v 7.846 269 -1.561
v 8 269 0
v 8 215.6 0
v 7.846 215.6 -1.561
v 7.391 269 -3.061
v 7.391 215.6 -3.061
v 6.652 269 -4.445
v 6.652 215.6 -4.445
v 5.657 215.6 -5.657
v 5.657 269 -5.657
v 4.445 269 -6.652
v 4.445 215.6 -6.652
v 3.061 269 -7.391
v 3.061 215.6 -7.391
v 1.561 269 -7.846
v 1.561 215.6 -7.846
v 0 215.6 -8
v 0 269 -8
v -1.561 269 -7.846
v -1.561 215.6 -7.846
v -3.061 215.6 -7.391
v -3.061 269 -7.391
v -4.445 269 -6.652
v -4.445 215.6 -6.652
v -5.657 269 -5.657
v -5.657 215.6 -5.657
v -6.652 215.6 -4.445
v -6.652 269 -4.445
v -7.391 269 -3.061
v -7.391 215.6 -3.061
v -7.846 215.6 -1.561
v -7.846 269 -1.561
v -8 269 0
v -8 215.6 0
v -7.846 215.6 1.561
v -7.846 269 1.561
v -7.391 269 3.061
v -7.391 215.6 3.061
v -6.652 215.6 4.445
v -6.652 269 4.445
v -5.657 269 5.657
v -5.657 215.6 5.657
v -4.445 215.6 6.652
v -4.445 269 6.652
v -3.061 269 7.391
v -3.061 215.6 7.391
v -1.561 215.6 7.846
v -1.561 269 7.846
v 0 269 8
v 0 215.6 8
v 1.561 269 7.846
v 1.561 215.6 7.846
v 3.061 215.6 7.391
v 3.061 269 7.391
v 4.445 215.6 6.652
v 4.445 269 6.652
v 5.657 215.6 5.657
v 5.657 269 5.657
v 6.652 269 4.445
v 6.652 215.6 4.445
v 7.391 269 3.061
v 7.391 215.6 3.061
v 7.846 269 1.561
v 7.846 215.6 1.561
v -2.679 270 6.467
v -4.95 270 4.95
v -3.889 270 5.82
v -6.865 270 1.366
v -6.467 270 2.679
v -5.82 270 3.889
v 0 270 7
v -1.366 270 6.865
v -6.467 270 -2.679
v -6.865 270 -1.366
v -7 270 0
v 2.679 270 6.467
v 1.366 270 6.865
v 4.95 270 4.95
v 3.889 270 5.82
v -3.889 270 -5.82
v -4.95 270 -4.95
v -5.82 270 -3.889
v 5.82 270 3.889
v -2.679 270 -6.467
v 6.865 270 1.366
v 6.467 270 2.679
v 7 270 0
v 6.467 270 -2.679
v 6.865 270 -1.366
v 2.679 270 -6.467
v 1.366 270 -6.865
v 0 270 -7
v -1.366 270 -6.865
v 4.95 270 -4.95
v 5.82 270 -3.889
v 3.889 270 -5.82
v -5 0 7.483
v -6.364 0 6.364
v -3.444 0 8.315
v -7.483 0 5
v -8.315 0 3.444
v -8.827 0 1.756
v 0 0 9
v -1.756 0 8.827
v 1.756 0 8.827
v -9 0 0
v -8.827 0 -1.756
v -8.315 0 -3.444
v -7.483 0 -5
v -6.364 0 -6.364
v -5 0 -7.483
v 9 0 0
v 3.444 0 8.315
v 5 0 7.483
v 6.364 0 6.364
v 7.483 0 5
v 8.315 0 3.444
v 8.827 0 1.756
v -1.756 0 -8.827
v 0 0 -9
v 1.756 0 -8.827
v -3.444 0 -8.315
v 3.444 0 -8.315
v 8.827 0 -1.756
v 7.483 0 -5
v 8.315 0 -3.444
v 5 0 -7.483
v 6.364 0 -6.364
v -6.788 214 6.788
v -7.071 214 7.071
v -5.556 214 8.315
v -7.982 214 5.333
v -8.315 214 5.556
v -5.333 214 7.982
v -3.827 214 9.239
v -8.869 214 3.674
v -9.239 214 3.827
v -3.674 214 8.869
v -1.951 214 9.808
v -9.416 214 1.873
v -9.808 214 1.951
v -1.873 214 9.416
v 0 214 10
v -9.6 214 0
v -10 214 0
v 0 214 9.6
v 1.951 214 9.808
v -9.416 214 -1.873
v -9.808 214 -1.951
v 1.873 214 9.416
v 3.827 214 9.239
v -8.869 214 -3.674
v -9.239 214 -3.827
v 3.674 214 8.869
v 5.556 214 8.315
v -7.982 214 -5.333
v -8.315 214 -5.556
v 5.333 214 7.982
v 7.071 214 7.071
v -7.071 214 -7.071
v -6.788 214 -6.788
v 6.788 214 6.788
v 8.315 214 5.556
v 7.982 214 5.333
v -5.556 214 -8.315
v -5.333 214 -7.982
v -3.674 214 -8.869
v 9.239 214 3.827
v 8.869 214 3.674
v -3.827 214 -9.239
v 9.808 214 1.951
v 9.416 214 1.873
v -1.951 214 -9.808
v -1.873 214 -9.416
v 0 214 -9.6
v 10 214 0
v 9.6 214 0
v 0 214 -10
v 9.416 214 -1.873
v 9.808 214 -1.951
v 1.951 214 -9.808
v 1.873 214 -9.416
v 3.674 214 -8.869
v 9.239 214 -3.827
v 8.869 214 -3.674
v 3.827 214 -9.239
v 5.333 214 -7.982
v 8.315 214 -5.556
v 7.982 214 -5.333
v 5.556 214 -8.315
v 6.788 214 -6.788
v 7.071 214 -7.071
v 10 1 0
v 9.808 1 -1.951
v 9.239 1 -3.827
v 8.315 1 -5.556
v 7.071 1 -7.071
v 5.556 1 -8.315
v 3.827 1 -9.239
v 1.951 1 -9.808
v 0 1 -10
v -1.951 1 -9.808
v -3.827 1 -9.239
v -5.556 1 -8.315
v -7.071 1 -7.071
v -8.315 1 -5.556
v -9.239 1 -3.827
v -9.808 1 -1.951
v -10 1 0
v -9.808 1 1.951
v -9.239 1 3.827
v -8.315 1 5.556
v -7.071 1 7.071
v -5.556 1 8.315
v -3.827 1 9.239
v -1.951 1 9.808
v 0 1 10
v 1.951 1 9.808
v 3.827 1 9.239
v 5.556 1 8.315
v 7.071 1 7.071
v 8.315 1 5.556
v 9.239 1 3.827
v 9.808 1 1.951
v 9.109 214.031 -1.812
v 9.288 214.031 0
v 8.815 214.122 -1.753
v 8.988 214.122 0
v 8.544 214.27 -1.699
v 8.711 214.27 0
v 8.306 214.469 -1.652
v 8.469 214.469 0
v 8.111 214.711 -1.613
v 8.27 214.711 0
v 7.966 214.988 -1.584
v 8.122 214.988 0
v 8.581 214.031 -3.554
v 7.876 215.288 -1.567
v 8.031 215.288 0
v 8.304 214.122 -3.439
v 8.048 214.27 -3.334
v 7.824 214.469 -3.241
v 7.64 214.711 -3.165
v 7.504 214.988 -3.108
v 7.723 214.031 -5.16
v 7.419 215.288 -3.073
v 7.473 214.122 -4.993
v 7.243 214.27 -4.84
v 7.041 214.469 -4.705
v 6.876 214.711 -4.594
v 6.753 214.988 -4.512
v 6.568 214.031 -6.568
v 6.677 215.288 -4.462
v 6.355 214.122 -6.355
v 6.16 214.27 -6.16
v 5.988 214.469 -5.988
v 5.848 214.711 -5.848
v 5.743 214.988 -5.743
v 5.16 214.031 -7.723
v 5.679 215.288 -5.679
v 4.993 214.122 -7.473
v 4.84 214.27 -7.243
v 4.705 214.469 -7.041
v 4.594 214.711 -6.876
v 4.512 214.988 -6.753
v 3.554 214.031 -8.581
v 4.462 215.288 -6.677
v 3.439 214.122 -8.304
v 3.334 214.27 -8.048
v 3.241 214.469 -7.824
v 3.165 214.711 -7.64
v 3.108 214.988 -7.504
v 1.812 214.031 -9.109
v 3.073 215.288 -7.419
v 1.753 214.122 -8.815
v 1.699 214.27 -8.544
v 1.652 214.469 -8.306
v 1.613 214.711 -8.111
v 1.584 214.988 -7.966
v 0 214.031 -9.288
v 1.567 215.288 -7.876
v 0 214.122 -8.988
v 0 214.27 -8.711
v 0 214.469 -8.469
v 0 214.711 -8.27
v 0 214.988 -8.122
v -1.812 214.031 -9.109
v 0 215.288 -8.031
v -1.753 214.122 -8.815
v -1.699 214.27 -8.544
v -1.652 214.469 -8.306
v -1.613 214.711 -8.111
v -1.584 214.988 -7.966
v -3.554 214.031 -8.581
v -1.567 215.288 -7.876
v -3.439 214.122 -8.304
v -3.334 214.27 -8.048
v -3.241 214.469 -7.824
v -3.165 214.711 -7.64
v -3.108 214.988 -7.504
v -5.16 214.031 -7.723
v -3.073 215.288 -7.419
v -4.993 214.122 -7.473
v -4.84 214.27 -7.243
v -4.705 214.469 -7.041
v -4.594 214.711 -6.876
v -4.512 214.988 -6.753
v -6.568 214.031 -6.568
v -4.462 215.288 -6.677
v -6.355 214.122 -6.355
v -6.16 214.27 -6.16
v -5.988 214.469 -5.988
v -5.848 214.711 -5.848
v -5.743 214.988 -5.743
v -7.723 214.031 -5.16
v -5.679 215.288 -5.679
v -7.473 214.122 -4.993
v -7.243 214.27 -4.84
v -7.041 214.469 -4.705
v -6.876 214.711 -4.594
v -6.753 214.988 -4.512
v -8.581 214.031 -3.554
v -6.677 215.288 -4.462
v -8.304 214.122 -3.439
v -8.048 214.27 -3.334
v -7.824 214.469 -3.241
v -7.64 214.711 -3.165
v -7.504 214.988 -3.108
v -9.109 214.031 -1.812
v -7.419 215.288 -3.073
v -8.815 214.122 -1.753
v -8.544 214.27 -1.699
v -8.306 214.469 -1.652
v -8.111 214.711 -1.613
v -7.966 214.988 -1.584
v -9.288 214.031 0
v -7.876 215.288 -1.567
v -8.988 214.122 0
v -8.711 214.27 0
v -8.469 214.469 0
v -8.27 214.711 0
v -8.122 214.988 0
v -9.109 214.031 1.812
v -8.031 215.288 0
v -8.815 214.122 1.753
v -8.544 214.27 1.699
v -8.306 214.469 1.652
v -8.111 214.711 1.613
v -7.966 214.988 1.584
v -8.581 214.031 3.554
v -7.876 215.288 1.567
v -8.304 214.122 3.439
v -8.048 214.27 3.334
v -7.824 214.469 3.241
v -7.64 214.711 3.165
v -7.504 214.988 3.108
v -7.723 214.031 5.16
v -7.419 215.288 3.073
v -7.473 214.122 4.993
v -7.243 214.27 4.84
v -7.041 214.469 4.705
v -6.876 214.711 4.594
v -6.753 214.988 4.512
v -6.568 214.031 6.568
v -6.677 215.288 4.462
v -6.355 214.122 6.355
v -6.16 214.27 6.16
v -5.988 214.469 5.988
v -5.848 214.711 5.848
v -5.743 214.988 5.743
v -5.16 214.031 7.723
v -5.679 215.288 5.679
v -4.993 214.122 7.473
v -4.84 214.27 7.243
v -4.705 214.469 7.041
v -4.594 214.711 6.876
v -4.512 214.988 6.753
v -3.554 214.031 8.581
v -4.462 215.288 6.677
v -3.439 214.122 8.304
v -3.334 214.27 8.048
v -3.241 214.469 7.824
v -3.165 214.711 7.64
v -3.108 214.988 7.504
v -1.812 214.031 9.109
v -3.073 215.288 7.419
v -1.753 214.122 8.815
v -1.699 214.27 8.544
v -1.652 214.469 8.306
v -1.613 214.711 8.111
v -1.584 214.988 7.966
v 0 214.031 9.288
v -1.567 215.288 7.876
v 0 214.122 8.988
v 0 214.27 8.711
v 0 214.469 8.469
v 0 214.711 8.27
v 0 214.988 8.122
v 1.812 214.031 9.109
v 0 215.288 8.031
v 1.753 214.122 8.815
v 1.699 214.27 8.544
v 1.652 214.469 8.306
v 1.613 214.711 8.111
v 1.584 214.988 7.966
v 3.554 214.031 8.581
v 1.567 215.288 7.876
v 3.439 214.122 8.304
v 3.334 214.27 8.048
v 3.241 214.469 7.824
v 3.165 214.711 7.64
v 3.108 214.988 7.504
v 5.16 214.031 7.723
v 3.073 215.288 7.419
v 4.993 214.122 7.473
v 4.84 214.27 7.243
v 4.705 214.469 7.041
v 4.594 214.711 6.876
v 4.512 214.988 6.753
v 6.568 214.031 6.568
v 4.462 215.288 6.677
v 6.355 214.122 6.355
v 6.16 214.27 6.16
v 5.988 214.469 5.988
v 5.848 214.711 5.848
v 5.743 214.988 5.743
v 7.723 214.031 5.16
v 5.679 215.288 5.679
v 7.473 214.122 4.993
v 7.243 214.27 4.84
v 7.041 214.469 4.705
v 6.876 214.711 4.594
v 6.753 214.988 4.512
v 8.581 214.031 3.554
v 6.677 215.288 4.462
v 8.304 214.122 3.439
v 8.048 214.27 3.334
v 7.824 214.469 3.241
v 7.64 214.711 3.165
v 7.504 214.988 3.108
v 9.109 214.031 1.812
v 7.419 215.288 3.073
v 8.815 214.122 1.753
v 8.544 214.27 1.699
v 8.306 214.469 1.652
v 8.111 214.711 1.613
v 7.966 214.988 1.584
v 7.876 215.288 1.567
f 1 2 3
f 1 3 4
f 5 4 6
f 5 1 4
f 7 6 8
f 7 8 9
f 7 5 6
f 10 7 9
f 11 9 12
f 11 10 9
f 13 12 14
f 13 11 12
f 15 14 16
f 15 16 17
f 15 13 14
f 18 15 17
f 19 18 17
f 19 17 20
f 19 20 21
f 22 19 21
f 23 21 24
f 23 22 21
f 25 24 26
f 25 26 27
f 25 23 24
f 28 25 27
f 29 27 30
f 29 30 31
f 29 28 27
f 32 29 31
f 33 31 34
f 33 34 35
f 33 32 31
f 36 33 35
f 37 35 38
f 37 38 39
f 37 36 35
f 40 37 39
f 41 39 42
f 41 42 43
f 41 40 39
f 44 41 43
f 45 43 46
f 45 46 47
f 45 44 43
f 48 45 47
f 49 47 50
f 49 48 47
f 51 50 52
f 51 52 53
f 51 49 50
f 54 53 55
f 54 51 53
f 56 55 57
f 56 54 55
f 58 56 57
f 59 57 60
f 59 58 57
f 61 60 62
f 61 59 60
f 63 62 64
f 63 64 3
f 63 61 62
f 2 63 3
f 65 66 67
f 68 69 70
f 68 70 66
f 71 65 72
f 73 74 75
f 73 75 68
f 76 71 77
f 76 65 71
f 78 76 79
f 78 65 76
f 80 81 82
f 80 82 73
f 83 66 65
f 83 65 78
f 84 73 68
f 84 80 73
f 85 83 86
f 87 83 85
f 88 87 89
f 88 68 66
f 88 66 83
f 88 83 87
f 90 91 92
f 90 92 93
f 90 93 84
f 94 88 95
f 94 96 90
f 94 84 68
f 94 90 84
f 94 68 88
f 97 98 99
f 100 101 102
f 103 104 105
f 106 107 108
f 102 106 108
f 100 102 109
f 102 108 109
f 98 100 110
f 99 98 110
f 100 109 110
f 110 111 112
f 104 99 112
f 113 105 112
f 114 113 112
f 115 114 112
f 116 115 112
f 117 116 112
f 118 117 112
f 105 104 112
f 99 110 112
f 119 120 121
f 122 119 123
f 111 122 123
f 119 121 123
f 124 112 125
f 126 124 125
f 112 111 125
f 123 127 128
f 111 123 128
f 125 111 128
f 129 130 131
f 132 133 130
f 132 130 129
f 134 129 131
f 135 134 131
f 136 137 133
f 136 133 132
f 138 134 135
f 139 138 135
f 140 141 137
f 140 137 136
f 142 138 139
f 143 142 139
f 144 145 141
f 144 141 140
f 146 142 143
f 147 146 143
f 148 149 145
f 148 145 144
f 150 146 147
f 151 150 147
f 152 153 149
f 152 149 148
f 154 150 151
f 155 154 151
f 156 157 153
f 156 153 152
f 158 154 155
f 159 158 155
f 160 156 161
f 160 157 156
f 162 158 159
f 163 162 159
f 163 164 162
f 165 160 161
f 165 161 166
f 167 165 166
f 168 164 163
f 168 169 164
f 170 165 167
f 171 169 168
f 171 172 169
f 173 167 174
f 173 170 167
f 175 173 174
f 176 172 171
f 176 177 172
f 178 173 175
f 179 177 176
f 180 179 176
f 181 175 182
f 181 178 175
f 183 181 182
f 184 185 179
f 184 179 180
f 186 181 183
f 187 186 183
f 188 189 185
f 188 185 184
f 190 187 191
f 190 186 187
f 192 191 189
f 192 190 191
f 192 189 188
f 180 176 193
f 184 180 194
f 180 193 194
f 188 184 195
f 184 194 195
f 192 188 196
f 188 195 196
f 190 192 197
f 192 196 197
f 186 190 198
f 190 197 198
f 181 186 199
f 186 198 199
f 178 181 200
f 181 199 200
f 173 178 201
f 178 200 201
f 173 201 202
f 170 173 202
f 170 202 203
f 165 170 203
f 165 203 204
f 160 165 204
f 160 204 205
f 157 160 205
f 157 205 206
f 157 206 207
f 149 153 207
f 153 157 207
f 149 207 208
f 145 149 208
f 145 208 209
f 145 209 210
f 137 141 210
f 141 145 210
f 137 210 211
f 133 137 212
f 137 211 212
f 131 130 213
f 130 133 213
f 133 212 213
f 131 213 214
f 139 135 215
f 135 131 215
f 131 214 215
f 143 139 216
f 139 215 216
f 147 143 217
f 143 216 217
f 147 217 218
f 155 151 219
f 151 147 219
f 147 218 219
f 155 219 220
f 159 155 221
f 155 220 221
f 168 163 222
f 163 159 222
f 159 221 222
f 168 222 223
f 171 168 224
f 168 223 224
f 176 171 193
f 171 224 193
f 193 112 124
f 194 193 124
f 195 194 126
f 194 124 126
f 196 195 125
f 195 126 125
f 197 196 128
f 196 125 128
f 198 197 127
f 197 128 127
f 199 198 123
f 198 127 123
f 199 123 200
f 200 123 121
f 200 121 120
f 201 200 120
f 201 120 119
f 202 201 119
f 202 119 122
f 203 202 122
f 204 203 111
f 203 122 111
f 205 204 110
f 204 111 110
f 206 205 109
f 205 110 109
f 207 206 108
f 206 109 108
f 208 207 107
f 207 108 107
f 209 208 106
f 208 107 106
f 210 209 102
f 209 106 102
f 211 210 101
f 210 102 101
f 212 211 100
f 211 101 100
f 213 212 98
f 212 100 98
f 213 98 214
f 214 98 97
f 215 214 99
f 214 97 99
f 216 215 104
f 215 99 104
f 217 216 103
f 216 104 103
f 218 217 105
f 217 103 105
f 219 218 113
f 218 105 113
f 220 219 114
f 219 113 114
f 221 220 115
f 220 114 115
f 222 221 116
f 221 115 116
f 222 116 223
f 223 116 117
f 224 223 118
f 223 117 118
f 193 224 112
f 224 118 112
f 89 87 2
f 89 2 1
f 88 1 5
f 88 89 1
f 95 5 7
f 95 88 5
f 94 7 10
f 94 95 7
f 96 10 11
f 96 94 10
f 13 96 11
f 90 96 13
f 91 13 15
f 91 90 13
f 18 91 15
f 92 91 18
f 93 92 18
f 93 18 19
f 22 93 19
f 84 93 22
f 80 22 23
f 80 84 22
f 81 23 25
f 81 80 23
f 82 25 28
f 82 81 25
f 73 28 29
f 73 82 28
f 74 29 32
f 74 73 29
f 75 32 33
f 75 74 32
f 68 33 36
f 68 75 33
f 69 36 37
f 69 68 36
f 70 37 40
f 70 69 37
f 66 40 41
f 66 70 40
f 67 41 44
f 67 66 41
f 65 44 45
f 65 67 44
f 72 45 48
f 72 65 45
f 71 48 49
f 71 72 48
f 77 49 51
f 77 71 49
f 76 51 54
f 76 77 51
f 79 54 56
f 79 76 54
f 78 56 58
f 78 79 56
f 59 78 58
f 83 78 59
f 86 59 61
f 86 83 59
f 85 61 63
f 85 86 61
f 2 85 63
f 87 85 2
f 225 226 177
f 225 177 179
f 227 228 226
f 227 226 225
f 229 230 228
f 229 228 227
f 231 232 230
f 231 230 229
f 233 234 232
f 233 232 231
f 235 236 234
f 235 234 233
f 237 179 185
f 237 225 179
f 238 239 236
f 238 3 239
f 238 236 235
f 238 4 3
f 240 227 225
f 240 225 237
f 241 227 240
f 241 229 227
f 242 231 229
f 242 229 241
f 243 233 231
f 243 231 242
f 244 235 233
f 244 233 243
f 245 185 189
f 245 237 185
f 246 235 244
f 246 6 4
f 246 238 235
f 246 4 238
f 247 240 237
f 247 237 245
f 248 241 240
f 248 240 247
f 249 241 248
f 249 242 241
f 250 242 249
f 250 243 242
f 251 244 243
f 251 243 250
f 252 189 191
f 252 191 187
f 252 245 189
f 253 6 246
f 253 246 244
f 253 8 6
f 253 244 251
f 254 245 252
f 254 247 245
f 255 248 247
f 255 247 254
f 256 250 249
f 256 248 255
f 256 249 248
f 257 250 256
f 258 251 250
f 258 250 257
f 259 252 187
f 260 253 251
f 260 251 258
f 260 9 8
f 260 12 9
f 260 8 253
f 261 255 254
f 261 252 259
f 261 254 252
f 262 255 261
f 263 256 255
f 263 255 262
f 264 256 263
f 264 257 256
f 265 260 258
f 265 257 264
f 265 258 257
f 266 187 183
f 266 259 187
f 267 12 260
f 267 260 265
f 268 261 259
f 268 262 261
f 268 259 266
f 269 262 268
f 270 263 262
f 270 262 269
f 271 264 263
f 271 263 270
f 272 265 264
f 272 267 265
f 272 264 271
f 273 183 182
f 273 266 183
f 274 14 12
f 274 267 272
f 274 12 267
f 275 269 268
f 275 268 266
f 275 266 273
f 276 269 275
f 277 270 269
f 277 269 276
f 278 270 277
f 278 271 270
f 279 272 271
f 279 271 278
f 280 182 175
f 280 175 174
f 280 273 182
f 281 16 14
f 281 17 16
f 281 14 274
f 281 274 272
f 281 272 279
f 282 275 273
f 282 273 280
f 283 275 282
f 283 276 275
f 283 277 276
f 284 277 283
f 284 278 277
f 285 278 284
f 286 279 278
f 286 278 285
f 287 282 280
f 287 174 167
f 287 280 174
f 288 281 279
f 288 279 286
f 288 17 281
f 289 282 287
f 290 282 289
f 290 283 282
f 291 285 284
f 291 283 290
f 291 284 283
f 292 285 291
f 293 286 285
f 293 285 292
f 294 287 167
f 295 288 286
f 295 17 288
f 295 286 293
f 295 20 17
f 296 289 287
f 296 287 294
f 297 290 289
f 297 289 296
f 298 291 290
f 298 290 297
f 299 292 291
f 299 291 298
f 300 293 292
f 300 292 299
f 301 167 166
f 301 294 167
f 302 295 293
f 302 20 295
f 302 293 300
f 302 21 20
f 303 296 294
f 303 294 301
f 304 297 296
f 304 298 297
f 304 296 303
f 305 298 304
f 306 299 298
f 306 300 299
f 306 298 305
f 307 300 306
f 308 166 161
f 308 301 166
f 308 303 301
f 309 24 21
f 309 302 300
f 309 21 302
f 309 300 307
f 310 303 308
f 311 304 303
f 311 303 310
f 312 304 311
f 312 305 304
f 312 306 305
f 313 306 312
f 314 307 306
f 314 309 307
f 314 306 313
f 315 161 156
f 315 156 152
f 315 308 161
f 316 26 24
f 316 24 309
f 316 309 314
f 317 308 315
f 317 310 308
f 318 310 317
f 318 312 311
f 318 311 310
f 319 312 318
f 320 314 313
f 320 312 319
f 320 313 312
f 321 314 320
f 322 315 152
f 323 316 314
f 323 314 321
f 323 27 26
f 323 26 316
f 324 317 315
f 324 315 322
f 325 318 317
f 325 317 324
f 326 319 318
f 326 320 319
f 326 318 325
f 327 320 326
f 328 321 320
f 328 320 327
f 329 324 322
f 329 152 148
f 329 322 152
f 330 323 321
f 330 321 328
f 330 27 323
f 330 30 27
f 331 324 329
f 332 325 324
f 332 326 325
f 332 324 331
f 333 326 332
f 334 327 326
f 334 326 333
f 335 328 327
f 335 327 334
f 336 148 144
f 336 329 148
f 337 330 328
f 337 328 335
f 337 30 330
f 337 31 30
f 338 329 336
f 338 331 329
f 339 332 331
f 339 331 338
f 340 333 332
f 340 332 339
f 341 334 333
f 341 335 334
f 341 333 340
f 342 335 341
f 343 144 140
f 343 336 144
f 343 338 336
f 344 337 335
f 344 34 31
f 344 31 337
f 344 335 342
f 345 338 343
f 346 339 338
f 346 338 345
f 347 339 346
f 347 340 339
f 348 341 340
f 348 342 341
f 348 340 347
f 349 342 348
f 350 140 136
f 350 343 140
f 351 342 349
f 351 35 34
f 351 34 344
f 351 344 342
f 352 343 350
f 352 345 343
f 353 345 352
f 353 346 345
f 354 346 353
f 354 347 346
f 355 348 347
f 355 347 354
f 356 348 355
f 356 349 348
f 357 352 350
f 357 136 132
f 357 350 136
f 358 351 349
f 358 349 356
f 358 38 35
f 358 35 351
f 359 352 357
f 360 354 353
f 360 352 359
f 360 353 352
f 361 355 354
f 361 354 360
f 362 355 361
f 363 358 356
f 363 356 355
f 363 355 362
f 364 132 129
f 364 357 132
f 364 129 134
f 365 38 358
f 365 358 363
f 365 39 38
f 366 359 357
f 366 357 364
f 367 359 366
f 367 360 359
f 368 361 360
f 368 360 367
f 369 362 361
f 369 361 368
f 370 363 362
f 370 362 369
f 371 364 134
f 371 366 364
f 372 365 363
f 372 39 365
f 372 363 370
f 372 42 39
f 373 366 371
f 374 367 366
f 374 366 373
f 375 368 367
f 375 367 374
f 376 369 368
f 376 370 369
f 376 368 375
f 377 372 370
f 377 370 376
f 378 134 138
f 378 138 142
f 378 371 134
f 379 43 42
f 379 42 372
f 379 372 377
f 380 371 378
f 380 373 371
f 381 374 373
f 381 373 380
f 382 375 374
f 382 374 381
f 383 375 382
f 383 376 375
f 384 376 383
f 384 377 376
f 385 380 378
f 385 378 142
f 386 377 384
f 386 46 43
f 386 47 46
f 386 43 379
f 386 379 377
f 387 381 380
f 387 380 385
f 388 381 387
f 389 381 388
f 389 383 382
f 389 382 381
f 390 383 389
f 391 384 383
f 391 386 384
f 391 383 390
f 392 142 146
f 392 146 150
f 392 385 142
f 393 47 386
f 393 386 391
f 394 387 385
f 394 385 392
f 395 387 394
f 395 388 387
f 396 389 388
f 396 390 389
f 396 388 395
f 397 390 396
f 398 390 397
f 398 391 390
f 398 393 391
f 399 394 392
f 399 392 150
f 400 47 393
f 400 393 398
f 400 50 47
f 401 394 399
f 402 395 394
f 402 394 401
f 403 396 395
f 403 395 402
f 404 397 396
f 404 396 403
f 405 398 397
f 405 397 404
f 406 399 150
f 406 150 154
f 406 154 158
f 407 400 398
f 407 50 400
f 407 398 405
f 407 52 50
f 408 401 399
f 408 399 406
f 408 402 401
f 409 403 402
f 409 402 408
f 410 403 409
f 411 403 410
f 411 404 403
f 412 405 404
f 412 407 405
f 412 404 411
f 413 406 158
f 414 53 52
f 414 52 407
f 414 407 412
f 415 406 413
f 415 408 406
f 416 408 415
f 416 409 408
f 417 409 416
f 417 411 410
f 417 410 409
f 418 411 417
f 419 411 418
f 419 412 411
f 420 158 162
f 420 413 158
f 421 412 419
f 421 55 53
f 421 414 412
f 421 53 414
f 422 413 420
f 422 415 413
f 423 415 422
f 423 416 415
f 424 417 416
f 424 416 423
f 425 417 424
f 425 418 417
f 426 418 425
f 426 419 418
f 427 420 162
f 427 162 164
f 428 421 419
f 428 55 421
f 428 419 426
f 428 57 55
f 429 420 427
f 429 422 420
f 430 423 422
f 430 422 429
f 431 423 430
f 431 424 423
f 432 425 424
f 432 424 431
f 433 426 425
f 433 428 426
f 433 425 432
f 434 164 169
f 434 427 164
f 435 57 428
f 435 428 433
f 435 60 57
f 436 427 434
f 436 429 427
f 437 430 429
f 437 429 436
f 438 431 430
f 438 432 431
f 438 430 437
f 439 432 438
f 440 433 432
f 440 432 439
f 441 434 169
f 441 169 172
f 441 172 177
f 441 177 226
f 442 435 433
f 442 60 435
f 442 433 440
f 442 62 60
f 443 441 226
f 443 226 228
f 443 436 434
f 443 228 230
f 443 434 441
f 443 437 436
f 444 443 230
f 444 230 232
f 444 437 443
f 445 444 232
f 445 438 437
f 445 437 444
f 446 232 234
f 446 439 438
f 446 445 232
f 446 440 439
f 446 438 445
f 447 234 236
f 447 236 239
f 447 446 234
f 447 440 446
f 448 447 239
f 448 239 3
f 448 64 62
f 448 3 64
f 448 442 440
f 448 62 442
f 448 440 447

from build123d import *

# Parameters (mm, degrees)
SKETCH_1_R          = 10
EXTRUDE_1_DEPTH     = 270
SKETCH_2_OUTSIDE_W  = 76.296
SKETCH_2_OUTSIDE_H  = 76.296
SKETCH_2_OUTSIDE_R  = 8
CUT_EXTRUDE_2_DEPTH = 56
FILLET_1_R          = 1.6
CHAMFER_1_SIZE      = 1


with BuildPart() as part:
    # Эскиз1 → Вытянуть1 (new body)
    with BuildSketch(Plane(origin=(0, 0, 0), x_dir=(1, 0, 0), z_dir=(0, 1, 0))):
        Circle(SKETCH_1_R)
    extrude(amount=EXTRUDE_1_DEPTH)

    # Эскиз2 outside → Вытянуть2 (cut)
    with BuildSketch(Plane(origin=(0, 270, 0), x_dir=(1, 0, 0), z_dir=(0, 1, 0))):
        Rectangle(SKETCH_2_OUTSIDE_W, SKETCH_2_OUTSIDE_H)
        Circle(SKETCH_2_OUTSIDE_R, mode=Mode.SUBTRACT)
    extrude(amount=-CUT_EXTRUDE_2_DEPTH, mode=Mode.SUBTRACT)

    # Скругление1
    fillet_1_edges = [part.edges().sort_by_distance(p)[0] for p in [
        (-8, 214, 0),
    ]]
    fillet(fillet_1_edges, radius=FILLET_1_R)

    # Фаска1
    chamfer_1_edges = [part.edges().sort_by_distance(p)[0] for p in [
        (-8, 270, 0),
        (-10, 0, 0),
    ]]
    chamfer(chamfer_1_edges, length=CHAMFER_1_SIZE)


solid = part.part
